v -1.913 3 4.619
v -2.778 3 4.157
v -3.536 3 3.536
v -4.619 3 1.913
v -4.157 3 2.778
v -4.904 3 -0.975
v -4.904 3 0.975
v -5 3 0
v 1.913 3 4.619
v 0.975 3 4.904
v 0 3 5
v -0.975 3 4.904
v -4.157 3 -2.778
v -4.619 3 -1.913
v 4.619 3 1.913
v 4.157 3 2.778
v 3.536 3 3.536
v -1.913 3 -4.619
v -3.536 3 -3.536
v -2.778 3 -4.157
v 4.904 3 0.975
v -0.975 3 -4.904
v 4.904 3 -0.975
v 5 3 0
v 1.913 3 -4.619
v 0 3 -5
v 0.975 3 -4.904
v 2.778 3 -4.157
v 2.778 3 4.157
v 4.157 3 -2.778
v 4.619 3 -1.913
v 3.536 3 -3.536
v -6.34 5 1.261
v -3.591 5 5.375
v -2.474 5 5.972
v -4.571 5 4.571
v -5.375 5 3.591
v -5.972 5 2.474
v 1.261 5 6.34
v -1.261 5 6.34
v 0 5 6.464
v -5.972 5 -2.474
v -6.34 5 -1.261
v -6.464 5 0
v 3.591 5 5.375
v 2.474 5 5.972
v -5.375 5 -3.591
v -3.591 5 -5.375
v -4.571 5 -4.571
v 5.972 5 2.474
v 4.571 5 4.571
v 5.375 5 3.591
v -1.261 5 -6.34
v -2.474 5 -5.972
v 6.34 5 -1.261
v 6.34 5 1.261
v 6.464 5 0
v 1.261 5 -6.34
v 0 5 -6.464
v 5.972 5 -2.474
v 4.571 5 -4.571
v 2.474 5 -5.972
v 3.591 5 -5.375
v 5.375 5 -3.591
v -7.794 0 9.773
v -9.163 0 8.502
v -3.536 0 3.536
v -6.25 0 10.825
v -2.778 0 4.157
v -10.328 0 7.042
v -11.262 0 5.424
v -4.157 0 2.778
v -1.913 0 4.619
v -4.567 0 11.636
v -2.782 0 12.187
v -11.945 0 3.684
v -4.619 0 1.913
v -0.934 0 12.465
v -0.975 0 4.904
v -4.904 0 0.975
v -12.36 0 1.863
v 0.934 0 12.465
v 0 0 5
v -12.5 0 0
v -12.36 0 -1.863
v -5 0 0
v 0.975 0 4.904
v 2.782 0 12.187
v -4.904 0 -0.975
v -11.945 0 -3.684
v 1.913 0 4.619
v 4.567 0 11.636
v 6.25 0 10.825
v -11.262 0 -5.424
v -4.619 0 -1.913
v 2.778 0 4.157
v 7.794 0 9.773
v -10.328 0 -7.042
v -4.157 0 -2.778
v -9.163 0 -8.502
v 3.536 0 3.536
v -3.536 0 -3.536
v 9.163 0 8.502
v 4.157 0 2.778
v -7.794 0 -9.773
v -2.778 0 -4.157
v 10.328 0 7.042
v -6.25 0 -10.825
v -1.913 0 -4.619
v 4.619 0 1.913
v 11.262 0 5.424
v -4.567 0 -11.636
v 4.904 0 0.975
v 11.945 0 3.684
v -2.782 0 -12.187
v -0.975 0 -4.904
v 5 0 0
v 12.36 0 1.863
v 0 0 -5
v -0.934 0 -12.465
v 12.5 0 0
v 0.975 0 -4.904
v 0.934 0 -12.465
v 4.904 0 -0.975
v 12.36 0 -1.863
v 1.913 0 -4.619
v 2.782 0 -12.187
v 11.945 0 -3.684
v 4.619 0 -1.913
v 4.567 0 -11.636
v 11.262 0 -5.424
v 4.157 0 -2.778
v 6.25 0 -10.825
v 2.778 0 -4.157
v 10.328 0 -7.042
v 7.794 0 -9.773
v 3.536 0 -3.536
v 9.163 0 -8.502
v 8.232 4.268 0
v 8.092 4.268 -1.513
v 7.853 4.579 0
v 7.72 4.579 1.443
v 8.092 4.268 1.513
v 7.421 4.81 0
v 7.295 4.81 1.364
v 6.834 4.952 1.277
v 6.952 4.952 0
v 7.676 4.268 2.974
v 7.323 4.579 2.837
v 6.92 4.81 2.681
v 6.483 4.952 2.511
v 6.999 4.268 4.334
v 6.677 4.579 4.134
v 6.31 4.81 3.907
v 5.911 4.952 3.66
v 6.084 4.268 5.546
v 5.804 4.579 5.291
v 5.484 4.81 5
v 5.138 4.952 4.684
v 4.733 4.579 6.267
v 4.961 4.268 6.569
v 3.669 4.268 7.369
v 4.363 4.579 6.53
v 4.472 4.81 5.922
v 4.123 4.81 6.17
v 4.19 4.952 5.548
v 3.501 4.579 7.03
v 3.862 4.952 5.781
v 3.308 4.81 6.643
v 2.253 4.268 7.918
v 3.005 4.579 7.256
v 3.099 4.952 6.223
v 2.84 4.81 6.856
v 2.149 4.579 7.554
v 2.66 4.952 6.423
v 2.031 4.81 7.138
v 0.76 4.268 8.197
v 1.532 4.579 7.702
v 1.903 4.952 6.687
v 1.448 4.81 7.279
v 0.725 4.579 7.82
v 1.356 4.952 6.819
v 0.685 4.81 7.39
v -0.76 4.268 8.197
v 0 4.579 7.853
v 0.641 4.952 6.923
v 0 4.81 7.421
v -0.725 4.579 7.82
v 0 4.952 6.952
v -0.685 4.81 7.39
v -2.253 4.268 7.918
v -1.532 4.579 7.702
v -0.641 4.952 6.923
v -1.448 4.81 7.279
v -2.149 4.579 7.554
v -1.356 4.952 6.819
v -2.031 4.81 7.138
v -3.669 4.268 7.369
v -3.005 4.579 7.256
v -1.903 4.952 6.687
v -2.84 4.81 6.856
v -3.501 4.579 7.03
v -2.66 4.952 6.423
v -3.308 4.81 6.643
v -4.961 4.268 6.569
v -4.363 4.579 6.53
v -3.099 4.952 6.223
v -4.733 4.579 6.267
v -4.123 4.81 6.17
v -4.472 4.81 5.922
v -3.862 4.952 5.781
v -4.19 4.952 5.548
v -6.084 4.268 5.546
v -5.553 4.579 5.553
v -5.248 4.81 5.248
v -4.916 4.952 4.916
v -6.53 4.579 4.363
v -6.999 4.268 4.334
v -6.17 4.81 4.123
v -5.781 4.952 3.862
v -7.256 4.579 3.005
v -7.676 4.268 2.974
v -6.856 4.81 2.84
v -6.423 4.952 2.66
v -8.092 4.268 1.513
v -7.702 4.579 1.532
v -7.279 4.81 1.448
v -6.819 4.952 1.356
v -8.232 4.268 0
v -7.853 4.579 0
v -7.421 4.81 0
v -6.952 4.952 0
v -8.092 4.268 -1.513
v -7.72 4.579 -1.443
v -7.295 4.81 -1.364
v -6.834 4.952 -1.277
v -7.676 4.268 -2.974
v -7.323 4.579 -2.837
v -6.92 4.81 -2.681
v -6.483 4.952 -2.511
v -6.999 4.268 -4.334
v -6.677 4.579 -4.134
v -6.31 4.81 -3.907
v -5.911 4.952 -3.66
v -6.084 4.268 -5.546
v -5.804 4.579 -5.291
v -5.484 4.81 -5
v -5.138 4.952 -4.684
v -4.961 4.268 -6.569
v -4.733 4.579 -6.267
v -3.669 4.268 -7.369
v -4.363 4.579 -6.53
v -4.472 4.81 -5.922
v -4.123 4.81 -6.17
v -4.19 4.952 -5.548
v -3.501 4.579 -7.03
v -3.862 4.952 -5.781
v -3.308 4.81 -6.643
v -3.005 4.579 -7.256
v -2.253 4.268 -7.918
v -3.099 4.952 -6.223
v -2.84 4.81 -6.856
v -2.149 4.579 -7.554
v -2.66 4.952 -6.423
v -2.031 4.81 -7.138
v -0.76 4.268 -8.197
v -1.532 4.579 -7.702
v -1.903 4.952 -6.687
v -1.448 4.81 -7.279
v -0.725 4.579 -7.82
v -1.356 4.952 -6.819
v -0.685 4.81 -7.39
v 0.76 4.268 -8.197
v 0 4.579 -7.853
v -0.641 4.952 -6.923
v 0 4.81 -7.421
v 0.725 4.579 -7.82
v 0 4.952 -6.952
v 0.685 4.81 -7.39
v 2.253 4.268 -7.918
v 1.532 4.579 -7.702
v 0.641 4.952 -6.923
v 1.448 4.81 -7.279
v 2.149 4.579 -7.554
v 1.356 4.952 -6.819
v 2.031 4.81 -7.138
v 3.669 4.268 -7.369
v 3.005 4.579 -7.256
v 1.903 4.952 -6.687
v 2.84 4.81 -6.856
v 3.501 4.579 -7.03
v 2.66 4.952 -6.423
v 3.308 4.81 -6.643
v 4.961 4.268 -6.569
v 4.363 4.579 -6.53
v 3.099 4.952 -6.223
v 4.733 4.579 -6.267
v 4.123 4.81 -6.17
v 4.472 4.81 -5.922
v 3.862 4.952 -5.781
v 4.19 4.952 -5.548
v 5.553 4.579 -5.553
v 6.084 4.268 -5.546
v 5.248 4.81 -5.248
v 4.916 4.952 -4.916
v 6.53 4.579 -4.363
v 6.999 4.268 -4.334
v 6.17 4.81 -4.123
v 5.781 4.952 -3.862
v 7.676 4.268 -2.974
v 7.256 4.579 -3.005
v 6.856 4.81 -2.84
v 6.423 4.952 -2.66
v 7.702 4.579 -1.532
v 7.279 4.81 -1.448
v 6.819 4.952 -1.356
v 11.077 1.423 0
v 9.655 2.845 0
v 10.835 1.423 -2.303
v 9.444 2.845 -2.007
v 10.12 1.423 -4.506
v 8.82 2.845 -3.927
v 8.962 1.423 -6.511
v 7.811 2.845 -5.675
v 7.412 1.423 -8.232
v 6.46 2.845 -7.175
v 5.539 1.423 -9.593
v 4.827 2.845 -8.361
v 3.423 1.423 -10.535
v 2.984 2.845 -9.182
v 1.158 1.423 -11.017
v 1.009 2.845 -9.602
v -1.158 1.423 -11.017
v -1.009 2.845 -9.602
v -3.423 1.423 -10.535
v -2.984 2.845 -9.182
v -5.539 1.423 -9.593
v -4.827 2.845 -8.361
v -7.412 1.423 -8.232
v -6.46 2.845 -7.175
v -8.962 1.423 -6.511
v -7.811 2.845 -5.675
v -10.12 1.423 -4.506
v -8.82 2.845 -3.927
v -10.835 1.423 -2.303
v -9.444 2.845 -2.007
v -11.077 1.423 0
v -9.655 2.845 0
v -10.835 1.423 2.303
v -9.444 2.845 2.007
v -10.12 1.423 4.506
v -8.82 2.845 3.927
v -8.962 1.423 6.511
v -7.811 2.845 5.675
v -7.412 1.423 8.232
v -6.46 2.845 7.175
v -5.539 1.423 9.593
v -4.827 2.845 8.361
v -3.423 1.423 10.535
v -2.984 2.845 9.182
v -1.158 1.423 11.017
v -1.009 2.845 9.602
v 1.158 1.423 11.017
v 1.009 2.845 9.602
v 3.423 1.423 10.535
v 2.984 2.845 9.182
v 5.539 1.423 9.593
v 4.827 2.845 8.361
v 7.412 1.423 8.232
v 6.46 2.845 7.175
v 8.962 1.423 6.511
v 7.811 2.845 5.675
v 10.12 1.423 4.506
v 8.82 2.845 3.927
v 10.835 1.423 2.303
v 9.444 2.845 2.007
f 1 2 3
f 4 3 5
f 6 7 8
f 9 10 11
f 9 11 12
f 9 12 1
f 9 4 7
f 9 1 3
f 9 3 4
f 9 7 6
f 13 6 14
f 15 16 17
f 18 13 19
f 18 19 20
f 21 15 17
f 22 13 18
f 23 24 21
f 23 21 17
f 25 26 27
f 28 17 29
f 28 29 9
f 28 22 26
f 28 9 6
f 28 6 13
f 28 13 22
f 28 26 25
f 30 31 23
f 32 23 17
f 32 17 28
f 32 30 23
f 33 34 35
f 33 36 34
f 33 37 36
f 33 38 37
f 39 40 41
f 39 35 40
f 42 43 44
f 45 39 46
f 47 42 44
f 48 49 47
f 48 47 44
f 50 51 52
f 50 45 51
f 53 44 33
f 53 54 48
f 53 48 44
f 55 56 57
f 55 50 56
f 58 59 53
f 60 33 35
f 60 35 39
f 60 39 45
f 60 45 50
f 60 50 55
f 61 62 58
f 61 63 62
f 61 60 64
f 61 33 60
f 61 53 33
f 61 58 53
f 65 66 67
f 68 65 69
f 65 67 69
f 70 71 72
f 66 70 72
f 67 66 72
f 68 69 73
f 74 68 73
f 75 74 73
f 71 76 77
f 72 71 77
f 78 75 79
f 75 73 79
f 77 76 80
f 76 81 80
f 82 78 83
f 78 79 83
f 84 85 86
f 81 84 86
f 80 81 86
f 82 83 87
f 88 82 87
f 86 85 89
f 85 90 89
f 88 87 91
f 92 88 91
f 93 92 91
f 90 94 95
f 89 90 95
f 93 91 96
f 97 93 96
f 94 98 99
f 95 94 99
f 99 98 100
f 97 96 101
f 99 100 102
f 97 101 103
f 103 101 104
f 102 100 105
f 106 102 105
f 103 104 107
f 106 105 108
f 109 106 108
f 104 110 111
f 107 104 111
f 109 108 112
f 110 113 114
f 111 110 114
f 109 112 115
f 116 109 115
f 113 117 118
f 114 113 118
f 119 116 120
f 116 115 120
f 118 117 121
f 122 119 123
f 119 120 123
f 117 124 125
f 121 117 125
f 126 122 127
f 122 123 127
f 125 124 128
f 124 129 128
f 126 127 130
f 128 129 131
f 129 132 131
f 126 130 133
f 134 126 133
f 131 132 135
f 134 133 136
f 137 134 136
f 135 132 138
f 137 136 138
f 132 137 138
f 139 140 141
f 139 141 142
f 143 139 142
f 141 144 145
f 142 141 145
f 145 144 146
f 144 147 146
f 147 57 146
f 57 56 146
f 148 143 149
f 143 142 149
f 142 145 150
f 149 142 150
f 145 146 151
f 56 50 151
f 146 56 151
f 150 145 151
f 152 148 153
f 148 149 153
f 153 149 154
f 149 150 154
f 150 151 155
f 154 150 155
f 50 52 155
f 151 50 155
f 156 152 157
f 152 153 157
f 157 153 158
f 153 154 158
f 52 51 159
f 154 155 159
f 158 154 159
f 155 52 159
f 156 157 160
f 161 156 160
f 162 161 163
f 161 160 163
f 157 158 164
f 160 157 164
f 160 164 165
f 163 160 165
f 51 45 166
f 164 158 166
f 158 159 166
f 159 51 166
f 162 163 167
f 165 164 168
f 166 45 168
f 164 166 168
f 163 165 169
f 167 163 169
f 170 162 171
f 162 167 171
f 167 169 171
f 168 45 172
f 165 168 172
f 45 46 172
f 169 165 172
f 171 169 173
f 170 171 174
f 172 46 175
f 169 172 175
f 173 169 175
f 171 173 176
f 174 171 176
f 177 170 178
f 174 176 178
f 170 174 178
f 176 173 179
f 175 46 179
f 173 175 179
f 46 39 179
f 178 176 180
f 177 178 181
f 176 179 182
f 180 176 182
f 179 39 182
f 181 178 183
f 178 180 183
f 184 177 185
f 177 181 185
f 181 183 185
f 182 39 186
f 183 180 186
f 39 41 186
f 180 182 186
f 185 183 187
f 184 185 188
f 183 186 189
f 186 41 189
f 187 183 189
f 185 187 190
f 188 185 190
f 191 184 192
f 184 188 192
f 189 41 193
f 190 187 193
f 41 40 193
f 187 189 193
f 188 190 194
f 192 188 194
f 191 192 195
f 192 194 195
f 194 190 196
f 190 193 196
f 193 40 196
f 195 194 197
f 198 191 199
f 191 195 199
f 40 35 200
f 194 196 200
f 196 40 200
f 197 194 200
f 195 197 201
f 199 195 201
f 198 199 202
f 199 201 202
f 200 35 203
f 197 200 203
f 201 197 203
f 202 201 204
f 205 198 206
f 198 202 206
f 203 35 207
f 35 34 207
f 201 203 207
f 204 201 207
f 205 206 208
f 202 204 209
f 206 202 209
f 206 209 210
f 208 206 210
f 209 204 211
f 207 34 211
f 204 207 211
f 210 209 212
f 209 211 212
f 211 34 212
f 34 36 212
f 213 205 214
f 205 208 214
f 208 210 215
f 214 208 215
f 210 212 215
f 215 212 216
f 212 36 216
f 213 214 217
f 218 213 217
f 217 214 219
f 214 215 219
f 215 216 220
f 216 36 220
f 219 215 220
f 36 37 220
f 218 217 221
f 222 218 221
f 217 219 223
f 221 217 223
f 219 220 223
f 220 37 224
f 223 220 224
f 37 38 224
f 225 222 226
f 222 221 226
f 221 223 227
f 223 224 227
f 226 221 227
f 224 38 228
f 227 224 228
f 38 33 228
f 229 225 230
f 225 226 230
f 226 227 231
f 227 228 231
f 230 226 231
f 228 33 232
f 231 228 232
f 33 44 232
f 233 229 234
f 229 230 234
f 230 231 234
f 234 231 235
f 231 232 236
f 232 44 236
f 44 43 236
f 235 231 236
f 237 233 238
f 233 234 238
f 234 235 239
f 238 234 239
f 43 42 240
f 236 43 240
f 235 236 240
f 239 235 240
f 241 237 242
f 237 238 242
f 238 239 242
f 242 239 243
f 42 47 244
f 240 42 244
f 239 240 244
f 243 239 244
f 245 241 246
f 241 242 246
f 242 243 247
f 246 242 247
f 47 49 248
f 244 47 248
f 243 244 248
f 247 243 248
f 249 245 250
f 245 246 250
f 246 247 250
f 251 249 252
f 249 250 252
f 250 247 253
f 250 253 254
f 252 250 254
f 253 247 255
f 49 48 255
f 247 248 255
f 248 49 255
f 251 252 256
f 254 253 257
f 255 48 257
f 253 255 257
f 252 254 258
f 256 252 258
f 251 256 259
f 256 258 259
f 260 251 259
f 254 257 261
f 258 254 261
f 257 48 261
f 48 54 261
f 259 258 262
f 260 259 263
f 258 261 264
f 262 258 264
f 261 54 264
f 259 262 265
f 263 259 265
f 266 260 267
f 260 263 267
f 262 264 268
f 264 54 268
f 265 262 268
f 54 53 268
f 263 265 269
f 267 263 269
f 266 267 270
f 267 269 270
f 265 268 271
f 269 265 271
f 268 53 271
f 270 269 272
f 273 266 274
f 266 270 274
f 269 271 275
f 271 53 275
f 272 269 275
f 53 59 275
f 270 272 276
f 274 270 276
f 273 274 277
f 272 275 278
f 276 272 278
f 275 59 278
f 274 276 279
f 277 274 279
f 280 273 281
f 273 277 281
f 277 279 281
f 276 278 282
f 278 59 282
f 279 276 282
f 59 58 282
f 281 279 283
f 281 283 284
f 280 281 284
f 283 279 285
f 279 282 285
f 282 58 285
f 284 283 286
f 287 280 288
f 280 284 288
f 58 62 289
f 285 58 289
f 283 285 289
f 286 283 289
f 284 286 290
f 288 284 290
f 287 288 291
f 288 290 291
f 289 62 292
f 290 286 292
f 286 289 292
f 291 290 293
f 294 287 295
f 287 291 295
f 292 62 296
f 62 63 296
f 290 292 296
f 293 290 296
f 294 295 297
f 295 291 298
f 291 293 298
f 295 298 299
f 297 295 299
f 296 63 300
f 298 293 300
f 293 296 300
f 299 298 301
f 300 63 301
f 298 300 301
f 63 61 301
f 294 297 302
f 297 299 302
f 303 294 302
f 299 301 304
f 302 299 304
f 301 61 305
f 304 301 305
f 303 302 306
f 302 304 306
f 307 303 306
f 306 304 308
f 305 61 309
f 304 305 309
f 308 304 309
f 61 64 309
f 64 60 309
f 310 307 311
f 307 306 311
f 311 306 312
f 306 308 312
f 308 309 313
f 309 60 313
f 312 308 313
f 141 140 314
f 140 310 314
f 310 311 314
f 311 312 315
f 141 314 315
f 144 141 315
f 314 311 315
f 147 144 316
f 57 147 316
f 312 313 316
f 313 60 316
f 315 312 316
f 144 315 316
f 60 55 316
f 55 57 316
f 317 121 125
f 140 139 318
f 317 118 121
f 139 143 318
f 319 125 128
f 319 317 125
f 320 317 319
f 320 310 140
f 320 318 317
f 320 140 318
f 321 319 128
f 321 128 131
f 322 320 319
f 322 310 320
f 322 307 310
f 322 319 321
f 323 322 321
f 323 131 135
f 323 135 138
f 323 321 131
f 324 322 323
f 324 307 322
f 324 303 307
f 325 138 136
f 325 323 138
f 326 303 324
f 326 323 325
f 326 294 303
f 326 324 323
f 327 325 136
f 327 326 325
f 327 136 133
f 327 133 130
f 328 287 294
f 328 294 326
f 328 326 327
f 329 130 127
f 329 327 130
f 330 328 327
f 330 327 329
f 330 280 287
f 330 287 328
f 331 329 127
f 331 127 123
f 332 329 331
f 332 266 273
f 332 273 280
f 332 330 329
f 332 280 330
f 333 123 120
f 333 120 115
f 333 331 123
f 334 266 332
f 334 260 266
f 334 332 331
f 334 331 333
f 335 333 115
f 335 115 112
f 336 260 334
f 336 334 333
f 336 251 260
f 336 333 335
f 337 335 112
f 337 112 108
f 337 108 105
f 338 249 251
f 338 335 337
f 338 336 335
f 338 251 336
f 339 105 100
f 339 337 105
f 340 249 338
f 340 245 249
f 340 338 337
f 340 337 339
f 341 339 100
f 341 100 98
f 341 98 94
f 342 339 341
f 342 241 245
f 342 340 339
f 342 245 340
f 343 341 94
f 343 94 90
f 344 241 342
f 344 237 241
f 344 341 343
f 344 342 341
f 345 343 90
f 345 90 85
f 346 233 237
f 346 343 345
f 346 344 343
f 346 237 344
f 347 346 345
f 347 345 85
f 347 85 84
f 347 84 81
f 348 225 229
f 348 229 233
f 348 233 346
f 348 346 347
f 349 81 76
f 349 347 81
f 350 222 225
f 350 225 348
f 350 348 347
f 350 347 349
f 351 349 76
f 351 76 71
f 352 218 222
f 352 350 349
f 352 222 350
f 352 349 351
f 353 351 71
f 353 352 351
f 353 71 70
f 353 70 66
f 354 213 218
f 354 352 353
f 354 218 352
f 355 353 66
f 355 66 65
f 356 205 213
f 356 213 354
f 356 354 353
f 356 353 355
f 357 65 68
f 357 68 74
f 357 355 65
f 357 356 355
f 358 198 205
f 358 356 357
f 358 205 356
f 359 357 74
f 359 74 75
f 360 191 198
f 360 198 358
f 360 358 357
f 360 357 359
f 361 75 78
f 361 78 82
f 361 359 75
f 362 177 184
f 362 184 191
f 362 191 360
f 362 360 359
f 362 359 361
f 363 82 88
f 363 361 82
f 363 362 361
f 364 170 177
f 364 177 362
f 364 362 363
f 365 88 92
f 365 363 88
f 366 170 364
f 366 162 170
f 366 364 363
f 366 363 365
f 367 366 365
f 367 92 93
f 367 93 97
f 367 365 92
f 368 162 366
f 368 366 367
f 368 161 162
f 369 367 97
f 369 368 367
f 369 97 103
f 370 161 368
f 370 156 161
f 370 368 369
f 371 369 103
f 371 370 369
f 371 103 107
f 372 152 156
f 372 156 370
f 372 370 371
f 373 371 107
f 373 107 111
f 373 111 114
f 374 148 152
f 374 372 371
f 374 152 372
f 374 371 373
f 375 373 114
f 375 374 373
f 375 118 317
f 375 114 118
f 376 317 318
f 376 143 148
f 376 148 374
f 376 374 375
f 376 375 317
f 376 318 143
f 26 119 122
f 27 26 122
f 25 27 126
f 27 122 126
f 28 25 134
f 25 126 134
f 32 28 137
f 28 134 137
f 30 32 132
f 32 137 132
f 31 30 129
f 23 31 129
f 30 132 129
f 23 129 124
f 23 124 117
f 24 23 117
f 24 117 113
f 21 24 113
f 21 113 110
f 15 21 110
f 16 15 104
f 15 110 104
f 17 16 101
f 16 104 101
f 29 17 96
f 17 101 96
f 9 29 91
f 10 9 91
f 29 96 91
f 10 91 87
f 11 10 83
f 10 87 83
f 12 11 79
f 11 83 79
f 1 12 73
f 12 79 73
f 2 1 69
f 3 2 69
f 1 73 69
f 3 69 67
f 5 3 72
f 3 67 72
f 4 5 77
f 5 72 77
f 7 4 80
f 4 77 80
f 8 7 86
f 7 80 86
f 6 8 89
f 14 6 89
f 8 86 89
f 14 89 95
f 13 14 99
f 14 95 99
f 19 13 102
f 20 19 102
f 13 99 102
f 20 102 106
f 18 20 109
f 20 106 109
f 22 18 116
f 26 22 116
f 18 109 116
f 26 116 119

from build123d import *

# Parameters (mm, degrees)
SKETCH1_R           = 12.5
BOSS_EXTRUDE1_DEPTH = 5
BOSS_EXTRUDE1_TAPER = 45
FILLET2_R           = 2.5
SKETCH2_R           = 5
CUT_EXTRUDE1_DEPTH  = 3


with BuildPart() as part:
    # Sketch1 → Boss-Extrude1 (new body)
    with BuildSketch(Plane(origin=(0, 0, 0), x_dir=(1, 0, 0), z_dir=(0, 1, 0))):
        Circle(SKETCH1_R)
    extrude(amount=BOSS_EXTRUDE1_DEPTH, taper=BOSS_EXTRUDE1_TAPER)

    # Fillet2
    fillet2_edges = [part.edges().sort_by_distance(p)[0] for p in [
        (-7.5, 5, 0),
    ]]
    fillet(fillet2_edges, radius=FILLET2_R)

    # Sketch2 → Cut-Extrude1 (cut)
    with BuildSketch(Plane.XZ):
        with Locations(Location((0, 0, 0), (0, 0, 270))):
            Circle(SKETCH2_R)
    extrude(amount=-CUT_EXTRUDE1_DEPTH, mode=Mode.SUBTRACT)


solid = part.part
